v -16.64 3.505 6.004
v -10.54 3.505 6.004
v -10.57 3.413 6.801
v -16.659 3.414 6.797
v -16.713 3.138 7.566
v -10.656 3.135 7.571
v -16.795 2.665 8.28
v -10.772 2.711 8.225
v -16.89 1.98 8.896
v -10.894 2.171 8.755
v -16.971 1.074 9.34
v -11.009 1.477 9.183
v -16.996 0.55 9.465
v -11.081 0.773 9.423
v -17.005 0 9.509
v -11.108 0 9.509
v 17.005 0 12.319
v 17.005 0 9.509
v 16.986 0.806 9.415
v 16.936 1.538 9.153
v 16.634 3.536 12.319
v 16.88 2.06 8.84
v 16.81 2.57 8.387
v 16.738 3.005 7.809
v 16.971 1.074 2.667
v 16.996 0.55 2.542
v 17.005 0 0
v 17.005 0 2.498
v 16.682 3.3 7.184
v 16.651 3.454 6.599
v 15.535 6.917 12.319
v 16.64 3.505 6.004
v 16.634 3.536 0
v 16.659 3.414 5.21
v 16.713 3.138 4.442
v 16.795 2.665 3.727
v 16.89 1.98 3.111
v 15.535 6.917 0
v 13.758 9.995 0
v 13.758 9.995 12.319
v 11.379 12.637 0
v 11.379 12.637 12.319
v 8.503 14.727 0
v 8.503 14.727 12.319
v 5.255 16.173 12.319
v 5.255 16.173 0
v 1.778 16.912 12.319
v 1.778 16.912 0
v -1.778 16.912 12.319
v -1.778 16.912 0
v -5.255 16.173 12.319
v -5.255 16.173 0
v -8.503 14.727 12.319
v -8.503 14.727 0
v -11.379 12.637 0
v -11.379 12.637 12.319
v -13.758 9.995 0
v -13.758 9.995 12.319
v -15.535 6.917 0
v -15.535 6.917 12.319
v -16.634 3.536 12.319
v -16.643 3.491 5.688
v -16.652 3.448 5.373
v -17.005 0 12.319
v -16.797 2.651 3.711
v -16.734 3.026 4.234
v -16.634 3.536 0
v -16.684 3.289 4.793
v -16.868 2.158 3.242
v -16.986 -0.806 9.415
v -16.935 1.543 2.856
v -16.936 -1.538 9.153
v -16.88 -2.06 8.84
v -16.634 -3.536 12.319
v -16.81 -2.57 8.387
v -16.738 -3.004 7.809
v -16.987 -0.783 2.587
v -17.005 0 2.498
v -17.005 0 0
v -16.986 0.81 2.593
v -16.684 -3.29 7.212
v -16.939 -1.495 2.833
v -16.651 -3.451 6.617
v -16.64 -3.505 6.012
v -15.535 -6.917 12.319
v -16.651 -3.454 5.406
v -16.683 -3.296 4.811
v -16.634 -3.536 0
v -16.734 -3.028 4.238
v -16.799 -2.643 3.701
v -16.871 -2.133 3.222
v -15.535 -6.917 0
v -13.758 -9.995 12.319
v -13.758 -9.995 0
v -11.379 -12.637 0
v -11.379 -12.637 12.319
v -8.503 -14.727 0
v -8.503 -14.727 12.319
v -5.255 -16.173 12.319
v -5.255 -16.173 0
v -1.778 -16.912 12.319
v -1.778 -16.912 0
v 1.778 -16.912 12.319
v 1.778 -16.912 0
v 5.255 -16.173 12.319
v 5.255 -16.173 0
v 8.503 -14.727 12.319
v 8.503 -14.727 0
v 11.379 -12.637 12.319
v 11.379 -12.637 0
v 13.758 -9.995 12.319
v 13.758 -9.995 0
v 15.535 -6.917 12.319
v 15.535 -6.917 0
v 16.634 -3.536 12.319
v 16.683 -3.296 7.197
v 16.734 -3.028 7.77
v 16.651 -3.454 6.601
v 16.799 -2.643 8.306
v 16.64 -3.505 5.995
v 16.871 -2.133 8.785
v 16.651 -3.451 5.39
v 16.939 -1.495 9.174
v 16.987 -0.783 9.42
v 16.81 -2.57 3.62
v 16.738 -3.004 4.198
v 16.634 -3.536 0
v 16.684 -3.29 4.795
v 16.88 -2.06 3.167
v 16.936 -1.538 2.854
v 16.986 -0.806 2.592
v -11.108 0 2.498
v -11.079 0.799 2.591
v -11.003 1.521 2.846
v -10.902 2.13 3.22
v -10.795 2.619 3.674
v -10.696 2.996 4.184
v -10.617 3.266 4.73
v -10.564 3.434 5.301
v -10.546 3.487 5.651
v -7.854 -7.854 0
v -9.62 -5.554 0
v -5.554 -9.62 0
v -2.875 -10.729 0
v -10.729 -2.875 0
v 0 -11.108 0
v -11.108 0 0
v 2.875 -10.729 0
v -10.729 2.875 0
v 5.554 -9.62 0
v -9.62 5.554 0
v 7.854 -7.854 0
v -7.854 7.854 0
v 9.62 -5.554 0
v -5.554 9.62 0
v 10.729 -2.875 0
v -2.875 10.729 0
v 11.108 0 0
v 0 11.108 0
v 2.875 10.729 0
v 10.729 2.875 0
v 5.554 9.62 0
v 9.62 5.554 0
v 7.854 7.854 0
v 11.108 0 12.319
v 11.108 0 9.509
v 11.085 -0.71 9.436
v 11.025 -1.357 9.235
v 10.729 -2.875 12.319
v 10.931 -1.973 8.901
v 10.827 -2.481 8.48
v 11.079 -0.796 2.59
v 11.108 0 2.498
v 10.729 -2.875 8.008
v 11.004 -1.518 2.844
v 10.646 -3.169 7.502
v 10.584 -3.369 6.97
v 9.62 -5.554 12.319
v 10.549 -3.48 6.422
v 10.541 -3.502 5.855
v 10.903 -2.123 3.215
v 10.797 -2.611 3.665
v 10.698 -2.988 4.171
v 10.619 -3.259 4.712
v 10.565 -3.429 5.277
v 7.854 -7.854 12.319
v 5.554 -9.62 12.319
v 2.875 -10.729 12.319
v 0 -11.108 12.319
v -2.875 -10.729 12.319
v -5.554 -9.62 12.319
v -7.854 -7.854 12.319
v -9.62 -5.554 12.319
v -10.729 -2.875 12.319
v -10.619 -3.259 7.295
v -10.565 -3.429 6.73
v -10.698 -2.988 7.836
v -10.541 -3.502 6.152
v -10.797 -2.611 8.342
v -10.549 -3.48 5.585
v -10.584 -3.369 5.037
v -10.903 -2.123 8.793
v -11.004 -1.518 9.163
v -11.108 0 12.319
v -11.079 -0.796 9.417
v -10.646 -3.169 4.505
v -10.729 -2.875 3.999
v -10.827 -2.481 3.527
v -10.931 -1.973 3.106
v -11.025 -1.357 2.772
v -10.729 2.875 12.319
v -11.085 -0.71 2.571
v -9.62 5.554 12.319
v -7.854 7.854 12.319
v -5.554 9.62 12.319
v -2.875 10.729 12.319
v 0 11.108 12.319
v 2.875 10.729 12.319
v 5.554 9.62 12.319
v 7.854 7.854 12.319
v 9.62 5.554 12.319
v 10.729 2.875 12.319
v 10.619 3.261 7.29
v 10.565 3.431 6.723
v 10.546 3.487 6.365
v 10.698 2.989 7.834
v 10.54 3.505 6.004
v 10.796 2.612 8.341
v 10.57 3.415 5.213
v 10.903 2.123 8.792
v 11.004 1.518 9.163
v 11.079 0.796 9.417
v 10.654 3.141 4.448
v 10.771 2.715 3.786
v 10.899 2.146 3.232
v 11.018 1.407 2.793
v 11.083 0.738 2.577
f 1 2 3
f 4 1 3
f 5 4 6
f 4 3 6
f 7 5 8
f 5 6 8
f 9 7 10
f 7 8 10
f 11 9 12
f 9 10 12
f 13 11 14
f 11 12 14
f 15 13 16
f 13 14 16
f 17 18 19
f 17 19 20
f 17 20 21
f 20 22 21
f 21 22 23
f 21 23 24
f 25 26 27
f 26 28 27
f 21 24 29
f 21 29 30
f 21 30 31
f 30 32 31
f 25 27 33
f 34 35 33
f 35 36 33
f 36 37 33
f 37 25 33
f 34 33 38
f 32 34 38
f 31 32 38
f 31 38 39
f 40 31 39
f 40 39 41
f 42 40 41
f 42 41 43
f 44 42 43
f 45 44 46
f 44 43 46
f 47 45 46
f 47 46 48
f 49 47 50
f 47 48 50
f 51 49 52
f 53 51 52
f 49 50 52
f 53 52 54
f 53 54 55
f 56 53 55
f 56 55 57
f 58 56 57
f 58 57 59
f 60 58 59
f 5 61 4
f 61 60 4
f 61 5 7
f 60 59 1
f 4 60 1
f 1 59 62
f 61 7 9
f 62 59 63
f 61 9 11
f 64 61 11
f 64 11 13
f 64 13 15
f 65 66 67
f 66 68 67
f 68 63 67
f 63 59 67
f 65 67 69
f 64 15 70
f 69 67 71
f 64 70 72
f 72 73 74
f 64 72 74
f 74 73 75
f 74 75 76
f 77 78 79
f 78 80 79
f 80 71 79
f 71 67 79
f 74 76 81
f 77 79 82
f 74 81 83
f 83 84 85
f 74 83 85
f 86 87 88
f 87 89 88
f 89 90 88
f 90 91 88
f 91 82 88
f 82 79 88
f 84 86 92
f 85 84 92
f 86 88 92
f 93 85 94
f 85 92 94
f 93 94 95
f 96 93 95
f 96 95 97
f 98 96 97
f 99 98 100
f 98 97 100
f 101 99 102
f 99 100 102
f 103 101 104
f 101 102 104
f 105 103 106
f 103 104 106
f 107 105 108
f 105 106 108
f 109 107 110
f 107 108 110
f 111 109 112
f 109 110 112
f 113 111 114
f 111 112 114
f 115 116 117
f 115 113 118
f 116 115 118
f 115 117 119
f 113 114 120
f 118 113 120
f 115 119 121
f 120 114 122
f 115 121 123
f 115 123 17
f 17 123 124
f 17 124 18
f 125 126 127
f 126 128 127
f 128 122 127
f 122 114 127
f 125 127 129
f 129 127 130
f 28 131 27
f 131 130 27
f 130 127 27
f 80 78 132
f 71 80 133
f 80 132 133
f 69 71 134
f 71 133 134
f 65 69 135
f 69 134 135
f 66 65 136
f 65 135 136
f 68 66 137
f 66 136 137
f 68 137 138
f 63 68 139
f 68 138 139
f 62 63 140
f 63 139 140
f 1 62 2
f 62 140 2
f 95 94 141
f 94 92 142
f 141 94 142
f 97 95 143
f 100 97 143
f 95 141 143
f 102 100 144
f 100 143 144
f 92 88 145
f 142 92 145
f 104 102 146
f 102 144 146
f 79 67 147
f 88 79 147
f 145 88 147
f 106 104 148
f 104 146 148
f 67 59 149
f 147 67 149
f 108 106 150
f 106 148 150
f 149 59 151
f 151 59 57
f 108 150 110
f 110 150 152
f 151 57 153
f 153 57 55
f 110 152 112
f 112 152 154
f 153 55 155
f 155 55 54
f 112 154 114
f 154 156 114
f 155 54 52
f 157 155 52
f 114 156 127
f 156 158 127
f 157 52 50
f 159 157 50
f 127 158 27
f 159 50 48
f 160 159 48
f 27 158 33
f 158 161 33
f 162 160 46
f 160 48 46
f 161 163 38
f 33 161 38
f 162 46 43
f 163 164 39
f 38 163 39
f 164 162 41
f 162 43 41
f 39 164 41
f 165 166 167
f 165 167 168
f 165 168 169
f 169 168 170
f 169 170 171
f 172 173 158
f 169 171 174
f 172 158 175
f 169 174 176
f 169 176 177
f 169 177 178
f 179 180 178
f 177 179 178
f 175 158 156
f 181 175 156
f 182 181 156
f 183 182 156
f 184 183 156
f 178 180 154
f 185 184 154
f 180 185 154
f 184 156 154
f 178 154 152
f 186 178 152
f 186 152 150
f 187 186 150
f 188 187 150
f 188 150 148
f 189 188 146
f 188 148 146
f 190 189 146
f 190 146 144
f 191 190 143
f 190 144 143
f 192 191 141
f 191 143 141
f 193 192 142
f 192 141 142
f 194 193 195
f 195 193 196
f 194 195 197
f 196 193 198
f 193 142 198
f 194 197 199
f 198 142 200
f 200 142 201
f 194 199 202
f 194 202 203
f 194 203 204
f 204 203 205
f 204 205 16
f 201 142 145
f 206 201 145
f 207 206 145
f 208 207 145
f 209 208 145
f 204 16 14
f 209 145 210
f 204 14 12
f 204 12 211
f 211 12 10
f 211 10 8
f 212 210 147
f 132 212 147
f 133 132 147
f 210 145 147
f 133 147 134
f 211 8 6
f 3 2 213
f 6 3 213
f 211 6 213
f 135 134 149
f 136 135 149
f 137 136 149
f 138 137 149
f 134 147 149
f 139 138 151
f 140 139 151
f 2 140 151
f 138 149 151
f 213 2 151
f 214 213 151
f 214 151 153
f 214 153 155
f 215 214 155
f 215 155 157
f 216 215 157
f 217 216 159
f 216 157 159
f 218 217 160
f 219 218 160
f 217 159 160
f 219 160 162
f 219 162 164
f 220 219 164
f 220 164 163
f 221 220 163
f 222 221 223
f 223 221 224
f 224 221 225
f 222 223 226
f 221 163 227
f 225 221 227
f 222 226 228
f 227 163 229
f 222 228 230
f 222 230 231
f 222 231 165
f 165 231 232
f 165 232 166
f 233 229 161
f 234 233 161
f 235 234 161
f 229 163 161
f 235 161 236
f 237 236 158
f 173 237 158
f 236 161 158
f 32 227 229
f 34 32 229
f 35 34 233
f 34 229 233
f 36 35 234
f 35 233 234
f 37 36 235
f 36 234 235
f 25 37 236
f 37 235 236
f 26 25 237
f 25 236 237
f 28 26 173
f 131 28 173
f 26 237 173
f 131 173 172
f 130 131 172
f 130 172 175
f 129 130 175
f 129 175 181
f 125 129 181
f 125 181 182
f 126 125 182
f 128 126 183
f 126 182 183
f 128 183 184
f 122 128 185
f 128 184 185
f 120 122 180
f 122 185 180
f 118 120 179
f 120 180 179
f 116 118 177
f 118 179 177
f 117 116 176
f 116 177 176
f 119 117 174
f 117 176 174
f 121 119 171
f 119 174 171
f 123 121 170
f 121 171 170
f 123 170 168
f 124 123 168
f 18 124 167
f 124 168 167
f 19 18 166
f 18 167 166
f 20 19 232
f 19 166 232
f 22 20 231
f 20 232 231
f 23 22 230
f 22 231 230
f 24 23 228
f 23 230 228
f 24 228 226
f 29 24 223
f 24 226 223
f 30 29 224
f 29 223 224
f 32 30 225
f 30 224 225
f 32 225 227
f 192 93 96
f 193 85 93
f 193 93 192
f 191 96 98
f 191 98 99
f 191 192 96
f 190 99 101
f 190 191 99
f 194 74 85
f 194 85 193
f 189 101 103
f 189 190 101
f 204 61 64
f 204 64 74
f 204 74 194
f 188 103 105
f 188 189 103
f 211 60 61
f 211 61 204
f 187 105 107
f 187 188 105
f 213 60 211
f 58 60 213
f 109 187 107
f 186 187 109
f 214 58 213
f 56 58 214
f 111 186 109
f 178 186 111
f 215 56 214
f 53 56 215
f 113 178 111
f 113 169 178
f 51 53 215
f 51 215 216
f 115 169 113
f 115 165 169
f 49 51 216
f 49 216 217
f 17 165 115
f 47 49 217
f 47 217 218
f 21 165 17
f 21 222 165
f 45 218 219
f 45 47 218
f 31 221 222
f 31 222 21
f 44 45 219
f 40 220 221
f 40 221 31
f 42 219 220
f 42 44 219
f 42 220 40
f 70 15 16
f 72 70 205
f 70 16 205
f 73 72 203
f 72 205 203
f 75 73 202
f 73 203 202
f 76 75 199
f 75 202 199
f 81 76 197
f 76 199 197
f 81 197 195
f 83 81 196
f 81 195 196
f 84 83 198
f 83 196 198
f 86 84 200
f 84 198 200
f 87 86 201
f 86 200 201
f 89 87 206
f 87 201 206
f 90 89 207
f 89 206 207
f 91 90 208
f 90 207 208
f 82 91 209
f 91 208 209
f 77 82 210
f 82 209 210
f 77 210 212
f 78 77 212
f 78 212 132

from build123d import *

# Parameters (mm, degrees)
F0_R      = 17.0053
F1_DEPTH  = 12.319
F3_DEPTH  = 25.4
F3_FACE_R = 3.5052
F4_DEPTH  = 25.4
F5_R      = 11.107827
F6_DEPTH  = 25.4


with BuildPart() as f1:
    # F0 (on Top) → F1 (new body)
    with BuildSketch(Plane.XY):
        Circle(F0_R)
    extrude(amount=F1_DEPTH)

    # F2 (on Right) → F3 (cut)
    with BuildSketch(Plane.YZ):
        with BuildLine():
            ThreePointArc((0, 9.508782), (-3.5052, 6.003582), (0, 2.498382))
            Line((0, 2.498382), (0, 6.003582))
            Line((0, 6.003582), (0, 9.508782))
        make_face()
        with BuildLine():
            Line((0, 6.003582), (0, 2.498382))
            ThreePointArc((0, 2.498382), (2.478551, 3.525031), (3.5052, 6.003582))
            ThreePointArc((3.5052, 6.003582), (2.478551, 8.482132), (0, 9.508782))
            Line((0, 9.508782), (0, 6.003582))
        make_face()
    extrude(amount=-F3_DEPTH, mode=Mode.SUBTRACT)

    # F3_face (on face) → F4 (cut)
    with BuildSketch(Plane(origin=(0, 0, 6.003582), x_dir=(0, 1, 0), z_dir=(-1, 0, 0))):
        Circle(F3_FACE_R)
    extrude(amount=-F4_DEPTH, mode=Mode.SUBTRACT)

    # F5 (on face) → F6 (cut)
    with BuildSketch(Plane(origin=(0, 0, 0), x_dir=(1, 0, 0), z_dir=(0, 0, -1))):
        Circle(F5_R)
    extrude(amount=-F6_DEPTH, mode=Mode.SUBTRACT)


solid = f1.part
